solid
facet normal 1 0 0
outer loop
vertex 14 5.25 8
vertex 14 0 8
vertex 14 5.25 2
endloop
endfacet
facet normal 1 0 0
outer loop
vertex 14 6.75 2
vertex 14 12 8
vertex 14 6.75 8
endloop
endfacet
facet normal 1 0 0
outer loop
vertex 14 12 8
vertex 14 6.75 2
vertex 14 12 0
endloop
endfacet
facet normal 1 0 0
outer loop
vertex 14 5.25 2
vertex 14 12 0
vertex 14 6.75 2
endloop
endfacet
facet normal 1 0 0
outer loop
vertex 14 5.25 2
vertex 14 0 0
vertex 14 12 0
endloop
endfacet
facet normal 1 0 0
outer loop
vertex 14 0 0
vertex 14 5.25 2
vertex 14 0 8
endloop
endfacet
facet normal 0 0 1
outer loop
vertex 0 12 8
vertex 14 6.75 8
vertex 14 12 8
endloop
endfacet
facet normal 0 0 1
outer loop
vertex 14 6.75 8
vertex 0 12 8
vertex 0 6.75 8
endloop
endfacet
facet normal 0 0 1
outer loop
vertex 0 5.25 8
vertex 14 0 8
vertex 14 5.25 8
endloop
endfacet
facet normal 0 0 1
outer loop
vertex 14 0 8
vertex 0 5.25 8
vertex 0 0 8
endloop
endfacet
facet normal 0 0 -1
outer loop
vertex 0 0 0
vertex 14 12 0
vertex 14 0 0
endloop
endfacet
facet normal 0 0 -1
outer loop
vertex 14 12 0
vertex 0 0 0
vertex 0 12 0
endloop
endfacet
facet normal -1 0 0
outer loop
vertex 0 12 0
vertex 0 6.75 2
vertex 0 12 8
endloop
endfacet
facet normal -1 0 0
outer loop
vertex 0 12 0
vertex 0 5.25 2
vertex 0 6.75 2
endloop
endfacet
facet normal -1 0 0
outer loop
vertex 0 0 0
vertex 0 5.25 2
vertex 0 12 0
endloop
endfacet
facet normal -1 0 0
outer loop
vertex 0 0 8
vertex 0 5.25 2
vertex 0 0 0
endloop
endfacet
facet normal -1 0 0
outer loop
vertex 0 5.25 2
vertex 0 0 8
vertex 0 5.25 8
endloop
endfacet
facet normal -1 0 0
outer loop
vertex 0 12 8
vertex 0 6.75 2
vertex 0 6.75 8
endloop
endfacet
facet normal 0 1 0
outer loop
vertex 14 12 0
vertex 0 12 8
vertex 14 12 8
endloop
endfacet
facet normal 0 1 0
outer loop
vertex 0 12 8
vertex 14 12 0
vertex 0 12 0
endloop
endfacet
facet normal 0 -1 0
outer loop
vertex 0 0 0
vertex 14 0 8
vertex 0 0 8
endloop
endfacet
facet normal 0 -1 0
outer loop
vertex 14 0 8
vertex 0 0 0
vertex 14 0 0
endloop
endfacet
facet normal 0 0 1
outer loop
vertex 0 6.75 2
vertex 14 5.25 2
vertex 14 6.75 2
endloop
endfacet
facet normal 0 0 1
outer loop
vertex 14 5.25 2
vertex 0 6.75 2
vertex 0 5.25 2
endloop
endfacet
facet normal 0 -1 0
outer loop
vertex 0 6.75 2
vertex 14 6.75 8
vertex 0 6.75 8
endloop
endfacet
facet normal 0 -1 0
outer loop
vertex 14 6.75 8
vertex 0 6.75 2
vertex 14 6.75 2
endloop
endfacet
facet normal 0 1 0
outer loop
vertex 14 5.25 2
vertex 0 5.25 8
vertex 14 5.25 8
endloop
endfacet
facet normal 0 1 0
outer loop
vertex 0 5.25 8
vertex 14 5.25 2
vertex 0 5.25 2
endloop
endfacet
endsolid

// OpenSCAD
$fn = 32;

// ----------------------------------------------------------------------
// Micro clip: slotted block, 5-20 mm class
// ----------------------------------------------------------------------

// --- parameters (mm) ---
block_l = 14;             // block length, X
block_w = 12;             // block width, Y
block_h = 8;              // block height, Z
slot_w = 1.5;             // slot width
slot_d = 6;               // slot depth from the top

difference() {
  cube([block_l, block_w, block_h]);
  translate([-1, block_w / 2 - slot_w / 2, block_h - slot_d])
    cube([block_l + 2, slot_w, slot_d + 1]);
}
